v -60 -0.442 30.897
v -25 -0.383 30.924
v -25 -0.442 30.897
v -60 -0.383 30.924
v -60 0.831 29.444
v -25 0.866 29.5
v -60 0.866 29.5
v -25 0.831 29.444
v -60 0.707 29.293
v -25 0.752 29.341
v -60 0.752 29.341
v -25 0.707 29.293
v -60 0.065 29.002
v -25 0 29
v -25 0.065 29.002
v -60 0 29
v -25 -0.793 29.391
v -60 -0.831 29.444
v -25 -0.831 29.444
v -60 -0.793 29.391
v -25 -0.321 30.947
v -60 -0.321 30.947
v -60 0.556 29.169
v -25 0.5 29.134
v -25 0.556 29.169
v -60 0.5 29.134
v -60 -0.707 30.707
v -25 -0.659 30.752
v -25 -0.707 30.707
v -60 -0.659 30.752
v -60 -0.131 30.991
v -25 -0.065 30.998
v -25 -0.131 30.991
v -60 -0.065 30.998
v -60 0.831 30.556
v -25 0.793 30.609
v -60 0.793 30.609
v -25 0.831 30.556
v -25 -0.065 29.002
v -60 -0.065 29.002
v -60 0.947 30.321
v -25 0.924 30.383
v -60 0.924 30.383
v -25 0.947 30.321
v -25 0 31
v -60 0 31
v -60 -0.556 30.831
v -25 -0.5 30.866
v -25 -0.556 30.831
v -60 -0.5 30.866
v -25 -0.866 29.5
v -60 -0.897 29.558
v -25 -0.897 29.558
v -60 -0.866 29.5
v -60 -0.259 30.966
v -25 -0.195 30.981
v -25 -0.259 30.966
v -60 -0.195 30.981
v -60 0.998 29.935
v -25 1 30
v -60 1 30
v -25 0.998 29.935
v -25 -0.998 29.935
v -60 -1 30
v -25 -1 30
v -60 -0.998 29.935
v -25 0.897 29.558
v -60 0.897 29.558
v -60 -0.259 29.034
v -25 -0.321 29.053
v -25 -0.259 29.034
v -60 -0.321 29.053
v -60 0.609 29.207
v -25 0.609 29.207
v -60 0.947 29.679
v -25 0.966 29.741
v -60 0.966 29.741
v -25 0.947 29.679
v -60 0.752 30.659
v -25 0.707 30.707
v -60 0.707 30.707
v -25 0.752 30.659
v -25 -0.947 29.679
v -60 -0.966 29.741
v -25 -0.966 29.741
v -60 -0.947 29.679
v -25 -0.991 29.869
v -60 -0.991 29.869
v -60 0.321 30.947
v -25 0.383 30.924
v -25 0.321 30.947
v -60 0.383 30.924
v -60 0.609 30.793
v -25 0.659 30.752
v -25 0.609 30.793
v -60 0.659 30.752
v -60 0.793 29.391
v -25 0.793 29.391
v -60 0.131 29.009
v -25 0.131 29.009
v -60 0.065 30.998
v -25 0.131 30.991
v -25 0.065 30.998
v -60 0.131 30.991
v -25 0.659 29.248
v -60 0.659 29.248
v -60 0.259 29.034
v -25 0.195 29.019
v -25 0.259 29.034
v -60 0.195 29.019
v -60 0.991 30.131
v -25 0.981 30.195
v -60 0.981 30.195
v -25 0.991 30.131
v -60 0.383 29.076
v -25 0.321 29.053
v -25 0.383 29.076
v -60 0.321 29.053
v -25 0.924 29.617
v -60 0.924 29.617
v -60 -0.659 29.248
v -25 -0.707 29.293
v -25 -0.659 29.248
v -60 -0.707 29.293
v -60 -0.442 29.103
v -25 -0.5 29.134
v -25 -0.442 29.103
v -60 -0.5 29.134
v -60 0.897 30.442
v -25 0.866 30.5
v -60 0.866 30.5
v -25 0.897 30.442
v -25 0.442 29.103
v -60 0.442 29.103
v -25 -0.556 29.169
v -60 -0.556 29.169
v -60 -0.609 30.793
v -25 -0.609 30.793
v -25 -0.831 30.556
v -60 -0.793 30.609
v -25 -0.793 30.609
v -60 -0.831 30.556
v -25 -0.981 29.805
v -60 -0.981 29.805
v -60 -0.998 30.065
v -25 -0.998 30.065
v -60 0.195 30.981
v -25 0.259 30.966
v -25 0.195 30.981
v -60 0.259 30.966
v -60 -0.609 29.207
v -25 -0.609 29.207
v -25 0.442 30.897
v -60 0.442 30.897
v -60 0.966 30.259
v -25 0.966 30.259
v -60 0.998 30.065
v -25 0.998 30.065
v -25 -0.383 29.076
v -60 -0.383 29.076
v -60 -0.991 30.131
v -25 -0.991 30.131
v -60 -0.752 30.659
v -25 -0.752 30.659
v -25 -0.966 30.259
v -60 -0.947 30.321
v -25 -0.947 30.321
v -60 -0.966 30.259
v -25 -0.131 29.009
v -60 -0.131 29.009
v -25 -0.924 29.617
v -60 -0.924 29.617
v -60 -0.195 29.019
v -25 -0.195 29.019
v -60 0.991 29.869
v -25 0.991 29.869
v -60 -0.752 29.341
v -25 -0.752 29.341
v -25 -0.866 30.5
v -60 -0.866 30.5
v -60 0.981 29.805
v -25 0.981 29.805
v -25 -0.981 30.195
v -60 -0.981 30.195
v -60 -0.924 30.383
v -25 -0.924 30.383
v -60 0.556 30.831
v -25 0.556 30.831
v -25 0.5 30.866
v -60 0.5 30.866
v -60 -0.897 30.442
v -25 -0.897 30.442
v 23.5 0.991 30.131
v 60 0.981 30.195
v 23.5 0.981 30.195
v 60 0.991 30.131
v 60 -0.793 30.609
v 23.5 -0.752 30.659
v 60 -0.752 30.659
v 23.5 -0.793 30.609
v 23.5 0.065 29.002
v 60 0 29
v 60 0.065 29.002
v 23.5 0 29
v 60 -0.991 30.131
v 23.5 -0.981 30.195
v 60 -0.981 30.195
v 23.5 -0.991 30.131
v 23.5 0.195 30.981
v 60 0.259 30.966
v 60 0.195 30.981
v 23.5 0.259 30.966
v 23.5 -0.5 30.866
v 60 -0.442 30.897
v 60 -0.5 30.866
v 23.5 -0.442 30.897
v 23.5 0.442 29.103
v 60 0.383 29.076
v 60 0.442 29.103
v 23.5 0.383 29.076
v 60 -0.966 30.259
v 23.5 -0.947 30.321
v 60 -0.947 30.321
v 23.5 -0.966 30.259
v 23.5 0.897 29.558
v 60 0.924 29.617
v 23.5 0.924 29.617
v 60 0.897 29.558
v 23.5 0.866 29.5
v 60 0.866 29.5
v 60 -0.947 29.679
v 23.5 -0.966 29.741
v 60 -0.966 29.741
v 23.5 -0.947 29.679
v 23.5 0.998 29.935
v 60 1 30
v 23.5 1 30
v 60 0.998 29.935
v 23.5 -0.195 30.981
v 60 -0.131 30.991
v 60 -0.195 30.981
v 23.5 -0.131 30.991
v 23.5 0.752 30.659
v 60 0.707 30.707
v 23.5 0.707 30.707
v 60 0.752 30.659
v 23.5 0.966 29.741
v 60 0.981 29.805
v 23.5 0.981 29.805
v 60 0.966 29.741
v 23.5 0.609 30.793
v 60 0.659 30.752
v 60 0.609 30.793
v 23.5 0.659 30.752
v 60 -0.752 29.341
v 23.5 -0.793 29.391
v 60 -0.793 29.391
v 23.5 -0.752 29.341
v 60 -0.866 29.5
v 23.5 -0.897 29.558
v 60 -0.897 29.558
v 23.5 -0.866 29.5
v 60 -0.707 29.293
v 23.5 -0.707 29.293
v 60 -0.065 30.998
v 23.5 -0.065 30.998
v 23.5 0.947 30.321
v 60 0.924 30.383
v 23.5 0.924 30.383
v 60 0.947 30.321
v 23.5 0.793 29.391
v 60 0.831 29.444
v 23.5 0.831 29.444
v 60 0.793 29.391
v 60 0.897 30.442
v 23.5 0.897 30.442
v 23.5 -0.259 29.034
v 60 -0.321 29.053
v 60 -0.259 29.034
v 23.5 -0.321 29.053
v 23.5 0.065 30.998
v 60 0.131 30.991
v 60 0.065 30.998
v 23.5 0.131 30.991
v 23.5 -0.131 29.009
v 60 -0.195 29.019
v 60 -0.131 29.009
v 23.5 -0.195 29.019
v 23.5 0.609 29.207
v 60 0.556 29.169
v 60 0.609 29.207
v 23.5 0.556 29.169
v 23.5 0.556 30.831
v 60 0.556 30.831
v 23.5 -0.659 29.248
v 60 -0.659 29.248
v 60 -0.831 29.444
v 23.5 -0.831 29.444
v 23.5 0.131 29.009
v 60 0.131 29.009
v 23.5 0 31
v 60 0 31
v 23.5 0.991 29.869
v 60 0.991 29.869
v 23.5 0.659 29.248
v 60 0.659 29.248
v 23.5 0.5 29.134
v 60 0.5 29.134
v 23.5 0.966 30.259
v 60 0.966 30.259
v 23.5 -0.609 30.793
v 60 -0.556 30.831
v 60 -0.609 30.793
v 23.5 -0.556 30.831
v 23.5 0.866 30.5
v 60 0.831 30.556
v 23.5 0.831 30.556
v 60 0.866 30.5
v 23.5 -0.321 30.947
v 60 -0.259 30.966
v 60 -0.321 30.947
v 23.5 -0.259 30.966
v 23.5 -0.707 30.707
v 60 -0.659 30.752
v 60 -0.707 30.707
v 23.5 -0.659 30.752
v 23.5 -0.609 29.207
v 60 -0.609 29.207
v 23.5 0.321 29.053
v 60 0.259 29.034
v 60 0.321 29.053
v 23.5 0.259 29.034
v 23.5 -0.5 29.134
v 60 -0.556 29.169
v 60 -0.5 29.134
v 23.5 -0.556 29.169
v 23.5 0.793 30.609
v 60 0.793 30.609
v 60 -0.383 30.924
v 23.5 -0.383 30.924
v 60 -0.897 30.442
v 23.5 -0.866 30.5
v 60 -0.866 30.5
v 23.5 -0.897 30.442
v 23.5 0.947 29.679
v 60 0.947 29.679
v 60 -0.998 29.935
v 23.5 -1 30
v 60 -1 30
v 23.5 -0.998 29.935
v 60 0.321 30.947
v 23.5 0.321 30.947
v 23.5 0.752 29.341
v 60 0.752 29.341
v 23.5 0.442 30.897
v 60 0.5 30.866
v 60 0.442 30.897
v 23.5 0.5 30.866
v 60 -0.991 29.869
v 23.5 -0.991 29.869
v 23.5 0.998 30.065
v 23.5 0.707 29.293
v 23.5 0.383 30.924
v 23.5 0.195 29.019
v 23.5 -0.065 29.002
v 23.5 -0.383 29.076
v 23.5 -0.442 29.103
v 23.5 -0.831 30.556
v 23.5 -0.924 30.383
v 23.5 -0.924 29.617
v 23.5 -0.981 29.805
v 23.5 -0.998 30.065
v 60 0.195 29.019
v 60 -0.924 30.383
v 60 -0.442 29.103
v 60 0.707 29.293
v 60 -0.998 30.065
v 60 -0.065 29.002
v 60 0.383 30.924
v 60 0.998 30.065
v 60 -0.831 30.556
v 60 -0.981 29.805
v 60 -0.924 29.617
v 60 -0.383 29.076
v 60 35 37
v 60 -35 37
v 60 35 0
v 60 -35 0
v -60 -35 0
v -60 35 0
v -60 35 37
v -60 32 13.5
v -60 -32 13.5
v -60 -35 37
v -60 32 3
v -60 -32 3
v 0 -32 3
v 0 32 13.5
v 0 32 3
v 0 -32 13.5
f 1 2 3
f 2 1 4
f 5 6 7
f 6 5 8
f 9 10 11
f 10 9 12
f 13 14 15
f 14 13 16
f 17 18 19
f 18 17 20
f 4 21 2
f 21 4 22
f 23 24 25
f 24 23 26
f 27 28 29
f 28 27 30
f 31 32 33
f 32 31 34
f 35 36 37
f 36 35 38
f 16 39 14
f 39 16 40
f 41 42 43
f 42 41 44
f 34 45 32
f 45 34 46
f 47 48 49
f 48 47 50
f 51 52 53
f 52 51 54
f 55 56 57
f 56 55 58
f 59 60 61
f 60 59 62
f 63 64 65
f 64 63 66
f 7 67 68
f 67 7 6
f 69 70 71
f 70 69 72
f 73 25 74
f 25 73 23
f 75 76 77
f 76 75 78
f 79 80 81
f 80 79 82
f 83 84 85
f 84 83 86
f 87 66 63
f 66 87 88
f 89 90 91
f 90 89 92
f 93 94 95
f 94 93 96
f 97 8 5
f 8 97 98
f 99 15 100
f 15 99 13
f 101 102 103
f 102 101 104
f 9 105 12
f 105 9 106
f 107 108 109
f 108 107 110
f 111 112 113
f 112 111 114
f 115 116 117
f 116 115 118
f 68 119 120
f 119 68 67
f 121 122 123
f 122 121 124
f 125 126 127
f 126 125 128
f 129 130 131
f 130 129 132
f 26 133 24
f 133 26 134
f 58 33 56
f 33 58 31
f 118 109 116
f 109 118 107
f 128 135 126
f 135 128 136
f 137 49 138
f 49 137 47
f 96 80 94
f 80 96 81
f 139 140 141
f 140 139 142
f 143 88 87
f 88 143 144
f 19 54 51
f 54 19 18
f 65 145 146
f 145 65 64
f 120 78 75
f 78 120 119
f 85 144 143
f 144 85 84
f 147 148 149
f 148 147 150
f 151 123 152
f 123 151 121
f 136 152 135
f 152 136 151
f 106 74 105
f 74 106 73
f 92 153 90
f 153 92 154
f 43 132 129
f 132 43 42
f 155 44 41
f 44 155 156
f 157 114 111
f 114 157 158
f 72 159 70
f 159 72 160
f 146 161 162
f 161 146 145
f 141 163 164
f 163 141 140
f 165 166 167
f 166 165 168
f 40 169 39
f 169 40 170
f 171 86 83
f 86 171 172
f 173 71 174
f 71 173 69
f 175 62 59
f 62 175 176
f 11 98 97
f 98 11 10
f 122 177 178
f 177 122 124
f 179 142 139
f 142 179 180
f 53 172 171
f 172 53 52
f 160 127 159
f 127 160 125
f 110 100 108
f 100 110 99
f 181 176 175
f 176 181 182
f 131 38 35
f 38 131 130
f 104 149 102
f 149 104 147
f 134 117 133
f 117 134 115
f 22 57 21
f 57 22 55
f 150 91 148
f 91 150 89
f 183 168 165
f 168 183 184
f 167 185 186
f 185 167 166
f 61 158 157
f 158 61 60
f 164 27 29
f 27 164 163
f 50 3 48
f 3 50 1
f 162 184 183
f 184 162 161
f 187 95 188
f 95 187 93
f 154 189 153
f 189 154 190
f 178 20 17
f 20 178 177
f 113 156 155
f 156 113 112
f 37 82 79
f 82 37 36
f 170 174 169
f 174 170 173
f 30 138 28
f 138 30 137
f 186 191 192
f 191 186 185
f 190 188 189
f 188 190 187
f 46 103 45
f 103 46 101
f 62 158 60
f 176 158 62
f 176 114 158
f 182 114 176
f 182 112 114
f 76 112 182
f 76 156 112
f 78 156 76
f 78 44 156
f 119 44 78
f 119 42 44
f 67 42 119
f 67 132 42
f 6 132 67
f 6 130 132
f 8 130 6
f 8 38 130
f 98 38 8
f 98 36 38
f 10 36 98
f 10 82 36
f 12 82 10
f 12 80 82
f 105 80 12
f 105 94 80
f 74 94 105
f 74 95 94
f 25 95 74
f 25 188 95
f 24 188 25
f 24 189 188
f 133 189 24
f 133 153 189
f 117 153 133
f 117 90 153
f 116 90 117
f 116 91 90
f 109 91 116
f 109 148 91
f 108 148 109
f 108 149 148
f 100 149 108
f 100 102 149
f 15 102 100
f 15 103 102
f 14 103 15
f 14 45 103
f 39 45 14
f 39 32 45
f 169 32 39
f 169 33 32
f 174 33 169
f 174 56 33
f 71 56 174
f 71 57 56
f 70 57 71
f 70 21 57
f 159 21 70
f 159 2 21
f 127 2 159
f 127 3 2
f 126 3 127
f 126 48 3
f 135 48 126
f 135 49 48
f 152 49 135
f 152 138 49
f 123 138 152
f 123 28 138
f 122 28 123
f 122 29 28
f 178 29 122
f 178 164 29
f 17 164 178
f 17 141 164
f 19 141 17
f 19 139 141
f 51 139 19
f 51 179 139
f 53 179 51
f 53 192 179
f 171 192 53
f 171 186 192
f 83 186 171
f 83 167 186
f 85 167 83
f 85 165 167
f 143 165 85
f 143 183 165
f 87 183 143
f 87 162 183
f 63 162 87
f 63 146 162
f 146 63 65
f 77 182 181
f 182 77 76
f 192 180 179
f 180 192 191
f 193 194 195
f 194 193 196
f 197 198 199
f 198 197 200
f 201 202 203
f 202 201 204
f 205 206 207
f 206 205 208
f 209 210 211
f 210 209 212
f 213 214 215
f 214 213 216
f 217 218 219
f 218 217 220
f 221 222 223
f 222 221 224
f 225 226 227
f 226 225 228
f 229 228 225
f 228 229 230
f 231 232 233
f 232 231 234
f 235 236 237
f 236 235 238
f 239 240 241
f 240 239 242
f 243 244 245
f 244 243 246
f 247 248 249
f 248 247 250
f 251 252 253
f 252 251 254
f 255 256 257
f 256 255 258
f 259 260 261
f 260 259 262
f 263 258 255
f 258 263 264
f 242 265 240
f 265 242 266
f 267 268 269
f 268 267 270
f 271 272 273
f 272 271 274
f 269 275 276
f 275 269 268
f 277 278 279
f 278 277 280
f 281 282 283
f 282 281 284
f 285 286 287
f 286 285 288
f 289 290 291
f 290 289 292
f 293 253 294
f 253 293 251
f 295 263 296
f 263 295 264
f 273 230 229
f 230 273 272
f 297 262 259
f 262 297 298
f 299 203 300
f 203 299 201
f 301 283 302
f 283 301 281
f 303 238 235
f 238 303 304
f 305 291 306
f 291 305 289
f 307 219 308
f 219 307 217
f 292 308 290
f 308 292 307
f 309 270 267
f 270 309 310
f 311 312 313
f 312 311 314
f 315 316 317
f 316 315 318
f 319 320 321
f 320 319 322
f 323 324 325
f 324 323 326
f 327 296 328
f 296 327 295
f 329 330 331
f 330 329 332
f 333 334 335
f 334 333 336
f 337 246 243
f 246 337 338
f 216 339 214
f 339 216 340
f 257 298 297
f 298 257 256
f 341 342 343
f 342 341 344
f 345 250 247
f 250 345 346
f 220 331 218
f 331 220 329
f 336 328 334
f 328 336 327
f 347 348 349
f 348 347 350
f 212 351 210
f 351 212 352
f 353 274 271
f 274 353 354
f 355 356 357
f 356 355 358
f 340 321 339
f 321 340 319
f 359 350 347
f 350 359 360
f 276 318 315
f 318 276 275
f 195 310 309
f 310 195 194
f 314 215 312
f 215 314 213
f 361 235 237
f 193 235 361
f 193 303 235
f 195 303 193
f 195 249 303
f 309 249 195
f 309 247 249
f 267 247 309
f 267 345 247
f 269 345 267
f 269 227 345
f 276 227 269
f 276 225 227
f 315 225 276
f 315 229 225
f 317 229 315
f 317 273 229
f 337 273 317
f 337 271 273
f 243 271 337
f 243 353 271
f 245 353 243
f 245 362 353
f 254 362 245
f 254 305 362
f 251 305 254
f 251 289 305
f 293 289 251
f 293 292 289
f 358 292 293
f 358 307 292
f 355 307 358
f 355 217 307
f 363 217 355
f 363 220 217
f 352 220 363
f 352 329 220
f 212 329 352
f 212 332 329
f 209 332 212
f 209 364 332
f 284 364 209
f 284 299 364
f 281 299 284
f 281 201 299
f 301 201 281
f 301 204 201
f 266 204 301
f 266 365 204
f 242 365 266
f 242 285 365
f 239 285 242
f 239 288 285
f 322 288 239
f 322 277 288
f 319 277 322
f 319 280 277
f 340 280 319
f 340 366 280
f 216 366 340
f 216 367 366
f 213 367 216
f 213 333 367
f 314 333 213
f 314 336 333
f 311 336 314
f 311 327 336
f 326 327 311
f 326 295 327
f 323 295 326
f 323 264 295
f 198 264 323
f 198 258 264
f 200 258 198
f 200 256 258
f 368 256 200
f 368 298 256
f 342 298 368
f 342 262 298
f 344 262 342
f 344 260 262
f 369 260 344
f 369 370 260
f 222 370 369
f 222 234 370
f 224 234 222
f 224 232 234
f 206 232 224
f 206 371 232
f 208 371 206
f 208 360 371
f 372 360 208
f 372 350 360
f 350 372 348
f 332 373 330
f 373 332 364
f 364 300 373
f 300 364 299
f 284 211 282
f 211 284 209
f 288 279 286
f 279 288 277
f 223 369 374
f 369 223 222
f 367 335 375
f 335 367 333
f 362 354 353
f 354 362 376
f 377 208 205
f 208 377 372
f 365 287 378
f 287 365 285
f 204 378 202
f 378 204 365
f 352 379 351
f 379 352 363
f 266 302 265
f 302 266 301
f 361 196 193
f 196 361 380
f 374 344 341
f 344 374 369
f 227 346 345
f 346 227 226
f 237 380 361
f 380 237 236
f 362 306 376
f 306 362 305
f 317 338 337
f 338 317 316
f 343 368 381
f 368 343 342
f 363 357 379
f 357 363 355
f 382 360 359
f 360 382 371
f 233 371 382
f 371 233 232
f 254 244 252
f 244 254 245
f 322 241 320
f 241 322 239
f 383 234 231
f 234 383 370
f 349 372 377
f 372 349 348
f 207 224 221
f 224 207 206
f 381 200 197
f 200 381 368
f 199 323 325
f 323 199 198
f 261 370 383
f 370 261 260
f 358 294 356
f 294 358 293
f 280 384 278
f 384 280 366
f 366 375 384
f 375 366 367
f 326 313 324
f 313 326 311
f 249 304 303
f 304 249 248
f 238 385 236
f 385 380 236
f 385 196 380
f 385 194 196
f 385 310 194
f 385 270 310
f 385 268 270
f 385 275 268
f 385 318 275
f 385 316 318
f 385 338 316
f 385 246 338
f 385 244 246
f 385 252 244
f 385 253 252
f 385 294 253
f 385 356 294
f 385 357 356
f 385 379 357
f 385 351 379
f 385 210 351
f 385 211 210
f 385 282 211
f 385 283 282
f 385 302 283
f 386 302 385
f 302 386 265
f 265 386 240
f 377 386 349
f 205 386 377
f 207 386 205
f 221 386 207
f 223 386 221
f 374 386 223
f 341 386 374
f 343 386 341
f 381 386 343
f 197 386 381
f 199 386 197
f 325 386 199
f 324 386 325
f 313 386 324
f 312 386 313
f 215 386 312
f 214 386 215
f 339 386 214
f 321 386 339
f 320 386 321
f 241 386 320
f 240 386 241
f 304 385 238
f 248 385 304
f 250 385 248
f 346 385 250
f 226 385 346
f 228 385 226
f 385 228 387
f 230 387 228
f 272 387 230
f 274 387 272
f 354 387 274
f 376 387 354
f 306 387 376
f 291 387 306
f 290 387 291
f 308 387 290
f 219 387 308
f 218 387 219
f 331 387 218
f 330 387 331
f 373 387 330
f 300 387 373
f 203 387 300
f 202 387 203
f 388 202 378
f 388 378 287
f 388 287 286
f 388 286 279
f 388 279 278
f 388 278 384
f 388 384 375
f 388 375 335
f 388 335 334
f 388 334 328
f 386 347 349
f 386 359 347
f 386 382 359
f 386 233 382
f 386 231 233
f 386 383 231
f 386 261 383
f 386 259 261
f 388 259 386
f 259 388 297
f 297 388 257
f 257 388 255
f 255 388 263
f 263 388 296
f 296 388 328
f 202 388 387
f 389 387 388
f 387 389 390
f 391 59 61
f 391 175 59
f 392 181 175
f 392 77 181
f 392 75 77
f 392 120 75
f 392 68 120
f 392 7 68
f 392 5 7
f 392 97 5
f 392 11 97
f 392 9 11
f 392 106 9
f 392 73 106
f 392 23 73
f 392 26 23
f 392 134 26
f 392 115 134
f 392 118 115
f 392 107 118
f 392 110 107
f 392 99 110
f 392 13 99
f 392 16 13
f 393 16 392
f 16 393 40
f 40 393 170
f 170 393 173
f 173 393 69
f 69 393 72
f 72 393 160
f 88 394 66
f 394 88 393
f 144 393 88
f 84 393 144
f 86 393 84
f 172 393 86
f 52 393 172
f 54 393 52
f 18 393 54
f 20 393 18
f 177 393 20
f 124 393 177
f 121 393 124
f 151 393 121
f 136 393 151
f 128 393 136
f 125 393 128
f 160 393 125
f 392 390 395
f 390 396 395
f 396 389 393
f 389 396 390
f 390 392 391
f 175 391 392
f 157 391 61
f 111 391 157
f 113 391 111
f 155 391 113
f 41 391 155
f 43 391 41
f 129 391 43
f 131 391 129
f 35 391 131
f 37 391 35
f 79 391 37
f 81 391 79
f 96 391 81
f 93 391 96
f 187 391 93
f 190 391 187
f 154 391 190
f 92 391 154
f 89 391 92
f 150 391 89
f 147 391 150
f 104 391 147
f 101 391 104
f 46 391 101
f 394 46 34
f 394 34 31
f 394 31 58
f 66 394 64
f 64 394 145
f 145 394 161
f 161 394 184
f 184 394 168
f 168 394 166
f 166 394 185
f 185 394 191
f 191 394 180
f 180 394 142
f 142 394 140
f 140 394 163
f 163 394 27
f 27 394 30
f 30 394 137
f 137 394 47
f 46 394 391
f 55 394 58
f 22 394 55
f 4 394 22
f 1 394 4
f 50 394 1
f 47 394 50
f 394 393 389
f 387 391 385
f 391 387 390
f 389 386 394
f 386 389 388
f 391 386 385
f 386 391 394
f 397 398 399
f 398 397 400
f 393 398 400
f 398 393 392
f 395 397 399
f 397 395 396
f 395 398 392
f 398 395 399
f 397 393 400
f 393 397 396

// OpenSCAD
// Buffer tank for mini horizontal gel-electrophoresis box
// Print orientation: open top facing +Z, resting on XY plane at z = 0

// ---------------- Parameters ----------------
outer_x   = 120;   // outer length (X)
outer_y   = 70;    // outer width (Y)
outer_z   = 40;    // outer height (Z)
wall      = 3;     // wall thickness
floor     = 3;     // floor thickness

inner_x   = outer_x - 2*wall;   // inner length
inner_y   = outer_y - 2*wall;   // inner width
inner_z   = outer_z - wall - floor;  // inner height (from inner floor up)

platform_x = 60;     // platform length in X (centred)
platform_top_z = 13; // platform top height above inner floor (z = floor + 10)

hole_d    = 2;       // electrode hole diameter
hole_y    = 0;       // hole Y position
hole_z    = 30;      // hole Z position (above inner floor)

eps       = 0.5;     // cutter overshoot past faces

$fn = 96;

// ---------------- Model ----------------
difference() {
    // Tank body: open-top box with solid floor
    translate([-outer_x/2, -outer_y/2, 0])
        cube([outer_x, outer_y, outer_z]);

    // Cut out the open top (leaves the 3 mm wall at z = outer_z - wall)
    translate([-outer_x/2 - eps, -outer_y/2 - eps, outer_z - wall])
        cube([outer_x + 2*eps, outer_y + 2*eps, wall + eps]);

    // Gel-tray platform, raised from the floor, spanning the full inner width
    translate([-outer_x/2, -inner_y/2, floor])
        cube([platform_x, inner_y, platform_top_z - floor + eps]);

    // Horizontal electrode holes through each end wall, along X
    for (sx = [-1, 1])
        translate([sx > 0 ? outer_x/2 - hole_d/2 : -outer_x/2 - eps, hole_y, hole_z])
            rotate([0, 90, 0])
                cylinder(d = hole_d, h = outer_y + 2*eps, center = true);
}
